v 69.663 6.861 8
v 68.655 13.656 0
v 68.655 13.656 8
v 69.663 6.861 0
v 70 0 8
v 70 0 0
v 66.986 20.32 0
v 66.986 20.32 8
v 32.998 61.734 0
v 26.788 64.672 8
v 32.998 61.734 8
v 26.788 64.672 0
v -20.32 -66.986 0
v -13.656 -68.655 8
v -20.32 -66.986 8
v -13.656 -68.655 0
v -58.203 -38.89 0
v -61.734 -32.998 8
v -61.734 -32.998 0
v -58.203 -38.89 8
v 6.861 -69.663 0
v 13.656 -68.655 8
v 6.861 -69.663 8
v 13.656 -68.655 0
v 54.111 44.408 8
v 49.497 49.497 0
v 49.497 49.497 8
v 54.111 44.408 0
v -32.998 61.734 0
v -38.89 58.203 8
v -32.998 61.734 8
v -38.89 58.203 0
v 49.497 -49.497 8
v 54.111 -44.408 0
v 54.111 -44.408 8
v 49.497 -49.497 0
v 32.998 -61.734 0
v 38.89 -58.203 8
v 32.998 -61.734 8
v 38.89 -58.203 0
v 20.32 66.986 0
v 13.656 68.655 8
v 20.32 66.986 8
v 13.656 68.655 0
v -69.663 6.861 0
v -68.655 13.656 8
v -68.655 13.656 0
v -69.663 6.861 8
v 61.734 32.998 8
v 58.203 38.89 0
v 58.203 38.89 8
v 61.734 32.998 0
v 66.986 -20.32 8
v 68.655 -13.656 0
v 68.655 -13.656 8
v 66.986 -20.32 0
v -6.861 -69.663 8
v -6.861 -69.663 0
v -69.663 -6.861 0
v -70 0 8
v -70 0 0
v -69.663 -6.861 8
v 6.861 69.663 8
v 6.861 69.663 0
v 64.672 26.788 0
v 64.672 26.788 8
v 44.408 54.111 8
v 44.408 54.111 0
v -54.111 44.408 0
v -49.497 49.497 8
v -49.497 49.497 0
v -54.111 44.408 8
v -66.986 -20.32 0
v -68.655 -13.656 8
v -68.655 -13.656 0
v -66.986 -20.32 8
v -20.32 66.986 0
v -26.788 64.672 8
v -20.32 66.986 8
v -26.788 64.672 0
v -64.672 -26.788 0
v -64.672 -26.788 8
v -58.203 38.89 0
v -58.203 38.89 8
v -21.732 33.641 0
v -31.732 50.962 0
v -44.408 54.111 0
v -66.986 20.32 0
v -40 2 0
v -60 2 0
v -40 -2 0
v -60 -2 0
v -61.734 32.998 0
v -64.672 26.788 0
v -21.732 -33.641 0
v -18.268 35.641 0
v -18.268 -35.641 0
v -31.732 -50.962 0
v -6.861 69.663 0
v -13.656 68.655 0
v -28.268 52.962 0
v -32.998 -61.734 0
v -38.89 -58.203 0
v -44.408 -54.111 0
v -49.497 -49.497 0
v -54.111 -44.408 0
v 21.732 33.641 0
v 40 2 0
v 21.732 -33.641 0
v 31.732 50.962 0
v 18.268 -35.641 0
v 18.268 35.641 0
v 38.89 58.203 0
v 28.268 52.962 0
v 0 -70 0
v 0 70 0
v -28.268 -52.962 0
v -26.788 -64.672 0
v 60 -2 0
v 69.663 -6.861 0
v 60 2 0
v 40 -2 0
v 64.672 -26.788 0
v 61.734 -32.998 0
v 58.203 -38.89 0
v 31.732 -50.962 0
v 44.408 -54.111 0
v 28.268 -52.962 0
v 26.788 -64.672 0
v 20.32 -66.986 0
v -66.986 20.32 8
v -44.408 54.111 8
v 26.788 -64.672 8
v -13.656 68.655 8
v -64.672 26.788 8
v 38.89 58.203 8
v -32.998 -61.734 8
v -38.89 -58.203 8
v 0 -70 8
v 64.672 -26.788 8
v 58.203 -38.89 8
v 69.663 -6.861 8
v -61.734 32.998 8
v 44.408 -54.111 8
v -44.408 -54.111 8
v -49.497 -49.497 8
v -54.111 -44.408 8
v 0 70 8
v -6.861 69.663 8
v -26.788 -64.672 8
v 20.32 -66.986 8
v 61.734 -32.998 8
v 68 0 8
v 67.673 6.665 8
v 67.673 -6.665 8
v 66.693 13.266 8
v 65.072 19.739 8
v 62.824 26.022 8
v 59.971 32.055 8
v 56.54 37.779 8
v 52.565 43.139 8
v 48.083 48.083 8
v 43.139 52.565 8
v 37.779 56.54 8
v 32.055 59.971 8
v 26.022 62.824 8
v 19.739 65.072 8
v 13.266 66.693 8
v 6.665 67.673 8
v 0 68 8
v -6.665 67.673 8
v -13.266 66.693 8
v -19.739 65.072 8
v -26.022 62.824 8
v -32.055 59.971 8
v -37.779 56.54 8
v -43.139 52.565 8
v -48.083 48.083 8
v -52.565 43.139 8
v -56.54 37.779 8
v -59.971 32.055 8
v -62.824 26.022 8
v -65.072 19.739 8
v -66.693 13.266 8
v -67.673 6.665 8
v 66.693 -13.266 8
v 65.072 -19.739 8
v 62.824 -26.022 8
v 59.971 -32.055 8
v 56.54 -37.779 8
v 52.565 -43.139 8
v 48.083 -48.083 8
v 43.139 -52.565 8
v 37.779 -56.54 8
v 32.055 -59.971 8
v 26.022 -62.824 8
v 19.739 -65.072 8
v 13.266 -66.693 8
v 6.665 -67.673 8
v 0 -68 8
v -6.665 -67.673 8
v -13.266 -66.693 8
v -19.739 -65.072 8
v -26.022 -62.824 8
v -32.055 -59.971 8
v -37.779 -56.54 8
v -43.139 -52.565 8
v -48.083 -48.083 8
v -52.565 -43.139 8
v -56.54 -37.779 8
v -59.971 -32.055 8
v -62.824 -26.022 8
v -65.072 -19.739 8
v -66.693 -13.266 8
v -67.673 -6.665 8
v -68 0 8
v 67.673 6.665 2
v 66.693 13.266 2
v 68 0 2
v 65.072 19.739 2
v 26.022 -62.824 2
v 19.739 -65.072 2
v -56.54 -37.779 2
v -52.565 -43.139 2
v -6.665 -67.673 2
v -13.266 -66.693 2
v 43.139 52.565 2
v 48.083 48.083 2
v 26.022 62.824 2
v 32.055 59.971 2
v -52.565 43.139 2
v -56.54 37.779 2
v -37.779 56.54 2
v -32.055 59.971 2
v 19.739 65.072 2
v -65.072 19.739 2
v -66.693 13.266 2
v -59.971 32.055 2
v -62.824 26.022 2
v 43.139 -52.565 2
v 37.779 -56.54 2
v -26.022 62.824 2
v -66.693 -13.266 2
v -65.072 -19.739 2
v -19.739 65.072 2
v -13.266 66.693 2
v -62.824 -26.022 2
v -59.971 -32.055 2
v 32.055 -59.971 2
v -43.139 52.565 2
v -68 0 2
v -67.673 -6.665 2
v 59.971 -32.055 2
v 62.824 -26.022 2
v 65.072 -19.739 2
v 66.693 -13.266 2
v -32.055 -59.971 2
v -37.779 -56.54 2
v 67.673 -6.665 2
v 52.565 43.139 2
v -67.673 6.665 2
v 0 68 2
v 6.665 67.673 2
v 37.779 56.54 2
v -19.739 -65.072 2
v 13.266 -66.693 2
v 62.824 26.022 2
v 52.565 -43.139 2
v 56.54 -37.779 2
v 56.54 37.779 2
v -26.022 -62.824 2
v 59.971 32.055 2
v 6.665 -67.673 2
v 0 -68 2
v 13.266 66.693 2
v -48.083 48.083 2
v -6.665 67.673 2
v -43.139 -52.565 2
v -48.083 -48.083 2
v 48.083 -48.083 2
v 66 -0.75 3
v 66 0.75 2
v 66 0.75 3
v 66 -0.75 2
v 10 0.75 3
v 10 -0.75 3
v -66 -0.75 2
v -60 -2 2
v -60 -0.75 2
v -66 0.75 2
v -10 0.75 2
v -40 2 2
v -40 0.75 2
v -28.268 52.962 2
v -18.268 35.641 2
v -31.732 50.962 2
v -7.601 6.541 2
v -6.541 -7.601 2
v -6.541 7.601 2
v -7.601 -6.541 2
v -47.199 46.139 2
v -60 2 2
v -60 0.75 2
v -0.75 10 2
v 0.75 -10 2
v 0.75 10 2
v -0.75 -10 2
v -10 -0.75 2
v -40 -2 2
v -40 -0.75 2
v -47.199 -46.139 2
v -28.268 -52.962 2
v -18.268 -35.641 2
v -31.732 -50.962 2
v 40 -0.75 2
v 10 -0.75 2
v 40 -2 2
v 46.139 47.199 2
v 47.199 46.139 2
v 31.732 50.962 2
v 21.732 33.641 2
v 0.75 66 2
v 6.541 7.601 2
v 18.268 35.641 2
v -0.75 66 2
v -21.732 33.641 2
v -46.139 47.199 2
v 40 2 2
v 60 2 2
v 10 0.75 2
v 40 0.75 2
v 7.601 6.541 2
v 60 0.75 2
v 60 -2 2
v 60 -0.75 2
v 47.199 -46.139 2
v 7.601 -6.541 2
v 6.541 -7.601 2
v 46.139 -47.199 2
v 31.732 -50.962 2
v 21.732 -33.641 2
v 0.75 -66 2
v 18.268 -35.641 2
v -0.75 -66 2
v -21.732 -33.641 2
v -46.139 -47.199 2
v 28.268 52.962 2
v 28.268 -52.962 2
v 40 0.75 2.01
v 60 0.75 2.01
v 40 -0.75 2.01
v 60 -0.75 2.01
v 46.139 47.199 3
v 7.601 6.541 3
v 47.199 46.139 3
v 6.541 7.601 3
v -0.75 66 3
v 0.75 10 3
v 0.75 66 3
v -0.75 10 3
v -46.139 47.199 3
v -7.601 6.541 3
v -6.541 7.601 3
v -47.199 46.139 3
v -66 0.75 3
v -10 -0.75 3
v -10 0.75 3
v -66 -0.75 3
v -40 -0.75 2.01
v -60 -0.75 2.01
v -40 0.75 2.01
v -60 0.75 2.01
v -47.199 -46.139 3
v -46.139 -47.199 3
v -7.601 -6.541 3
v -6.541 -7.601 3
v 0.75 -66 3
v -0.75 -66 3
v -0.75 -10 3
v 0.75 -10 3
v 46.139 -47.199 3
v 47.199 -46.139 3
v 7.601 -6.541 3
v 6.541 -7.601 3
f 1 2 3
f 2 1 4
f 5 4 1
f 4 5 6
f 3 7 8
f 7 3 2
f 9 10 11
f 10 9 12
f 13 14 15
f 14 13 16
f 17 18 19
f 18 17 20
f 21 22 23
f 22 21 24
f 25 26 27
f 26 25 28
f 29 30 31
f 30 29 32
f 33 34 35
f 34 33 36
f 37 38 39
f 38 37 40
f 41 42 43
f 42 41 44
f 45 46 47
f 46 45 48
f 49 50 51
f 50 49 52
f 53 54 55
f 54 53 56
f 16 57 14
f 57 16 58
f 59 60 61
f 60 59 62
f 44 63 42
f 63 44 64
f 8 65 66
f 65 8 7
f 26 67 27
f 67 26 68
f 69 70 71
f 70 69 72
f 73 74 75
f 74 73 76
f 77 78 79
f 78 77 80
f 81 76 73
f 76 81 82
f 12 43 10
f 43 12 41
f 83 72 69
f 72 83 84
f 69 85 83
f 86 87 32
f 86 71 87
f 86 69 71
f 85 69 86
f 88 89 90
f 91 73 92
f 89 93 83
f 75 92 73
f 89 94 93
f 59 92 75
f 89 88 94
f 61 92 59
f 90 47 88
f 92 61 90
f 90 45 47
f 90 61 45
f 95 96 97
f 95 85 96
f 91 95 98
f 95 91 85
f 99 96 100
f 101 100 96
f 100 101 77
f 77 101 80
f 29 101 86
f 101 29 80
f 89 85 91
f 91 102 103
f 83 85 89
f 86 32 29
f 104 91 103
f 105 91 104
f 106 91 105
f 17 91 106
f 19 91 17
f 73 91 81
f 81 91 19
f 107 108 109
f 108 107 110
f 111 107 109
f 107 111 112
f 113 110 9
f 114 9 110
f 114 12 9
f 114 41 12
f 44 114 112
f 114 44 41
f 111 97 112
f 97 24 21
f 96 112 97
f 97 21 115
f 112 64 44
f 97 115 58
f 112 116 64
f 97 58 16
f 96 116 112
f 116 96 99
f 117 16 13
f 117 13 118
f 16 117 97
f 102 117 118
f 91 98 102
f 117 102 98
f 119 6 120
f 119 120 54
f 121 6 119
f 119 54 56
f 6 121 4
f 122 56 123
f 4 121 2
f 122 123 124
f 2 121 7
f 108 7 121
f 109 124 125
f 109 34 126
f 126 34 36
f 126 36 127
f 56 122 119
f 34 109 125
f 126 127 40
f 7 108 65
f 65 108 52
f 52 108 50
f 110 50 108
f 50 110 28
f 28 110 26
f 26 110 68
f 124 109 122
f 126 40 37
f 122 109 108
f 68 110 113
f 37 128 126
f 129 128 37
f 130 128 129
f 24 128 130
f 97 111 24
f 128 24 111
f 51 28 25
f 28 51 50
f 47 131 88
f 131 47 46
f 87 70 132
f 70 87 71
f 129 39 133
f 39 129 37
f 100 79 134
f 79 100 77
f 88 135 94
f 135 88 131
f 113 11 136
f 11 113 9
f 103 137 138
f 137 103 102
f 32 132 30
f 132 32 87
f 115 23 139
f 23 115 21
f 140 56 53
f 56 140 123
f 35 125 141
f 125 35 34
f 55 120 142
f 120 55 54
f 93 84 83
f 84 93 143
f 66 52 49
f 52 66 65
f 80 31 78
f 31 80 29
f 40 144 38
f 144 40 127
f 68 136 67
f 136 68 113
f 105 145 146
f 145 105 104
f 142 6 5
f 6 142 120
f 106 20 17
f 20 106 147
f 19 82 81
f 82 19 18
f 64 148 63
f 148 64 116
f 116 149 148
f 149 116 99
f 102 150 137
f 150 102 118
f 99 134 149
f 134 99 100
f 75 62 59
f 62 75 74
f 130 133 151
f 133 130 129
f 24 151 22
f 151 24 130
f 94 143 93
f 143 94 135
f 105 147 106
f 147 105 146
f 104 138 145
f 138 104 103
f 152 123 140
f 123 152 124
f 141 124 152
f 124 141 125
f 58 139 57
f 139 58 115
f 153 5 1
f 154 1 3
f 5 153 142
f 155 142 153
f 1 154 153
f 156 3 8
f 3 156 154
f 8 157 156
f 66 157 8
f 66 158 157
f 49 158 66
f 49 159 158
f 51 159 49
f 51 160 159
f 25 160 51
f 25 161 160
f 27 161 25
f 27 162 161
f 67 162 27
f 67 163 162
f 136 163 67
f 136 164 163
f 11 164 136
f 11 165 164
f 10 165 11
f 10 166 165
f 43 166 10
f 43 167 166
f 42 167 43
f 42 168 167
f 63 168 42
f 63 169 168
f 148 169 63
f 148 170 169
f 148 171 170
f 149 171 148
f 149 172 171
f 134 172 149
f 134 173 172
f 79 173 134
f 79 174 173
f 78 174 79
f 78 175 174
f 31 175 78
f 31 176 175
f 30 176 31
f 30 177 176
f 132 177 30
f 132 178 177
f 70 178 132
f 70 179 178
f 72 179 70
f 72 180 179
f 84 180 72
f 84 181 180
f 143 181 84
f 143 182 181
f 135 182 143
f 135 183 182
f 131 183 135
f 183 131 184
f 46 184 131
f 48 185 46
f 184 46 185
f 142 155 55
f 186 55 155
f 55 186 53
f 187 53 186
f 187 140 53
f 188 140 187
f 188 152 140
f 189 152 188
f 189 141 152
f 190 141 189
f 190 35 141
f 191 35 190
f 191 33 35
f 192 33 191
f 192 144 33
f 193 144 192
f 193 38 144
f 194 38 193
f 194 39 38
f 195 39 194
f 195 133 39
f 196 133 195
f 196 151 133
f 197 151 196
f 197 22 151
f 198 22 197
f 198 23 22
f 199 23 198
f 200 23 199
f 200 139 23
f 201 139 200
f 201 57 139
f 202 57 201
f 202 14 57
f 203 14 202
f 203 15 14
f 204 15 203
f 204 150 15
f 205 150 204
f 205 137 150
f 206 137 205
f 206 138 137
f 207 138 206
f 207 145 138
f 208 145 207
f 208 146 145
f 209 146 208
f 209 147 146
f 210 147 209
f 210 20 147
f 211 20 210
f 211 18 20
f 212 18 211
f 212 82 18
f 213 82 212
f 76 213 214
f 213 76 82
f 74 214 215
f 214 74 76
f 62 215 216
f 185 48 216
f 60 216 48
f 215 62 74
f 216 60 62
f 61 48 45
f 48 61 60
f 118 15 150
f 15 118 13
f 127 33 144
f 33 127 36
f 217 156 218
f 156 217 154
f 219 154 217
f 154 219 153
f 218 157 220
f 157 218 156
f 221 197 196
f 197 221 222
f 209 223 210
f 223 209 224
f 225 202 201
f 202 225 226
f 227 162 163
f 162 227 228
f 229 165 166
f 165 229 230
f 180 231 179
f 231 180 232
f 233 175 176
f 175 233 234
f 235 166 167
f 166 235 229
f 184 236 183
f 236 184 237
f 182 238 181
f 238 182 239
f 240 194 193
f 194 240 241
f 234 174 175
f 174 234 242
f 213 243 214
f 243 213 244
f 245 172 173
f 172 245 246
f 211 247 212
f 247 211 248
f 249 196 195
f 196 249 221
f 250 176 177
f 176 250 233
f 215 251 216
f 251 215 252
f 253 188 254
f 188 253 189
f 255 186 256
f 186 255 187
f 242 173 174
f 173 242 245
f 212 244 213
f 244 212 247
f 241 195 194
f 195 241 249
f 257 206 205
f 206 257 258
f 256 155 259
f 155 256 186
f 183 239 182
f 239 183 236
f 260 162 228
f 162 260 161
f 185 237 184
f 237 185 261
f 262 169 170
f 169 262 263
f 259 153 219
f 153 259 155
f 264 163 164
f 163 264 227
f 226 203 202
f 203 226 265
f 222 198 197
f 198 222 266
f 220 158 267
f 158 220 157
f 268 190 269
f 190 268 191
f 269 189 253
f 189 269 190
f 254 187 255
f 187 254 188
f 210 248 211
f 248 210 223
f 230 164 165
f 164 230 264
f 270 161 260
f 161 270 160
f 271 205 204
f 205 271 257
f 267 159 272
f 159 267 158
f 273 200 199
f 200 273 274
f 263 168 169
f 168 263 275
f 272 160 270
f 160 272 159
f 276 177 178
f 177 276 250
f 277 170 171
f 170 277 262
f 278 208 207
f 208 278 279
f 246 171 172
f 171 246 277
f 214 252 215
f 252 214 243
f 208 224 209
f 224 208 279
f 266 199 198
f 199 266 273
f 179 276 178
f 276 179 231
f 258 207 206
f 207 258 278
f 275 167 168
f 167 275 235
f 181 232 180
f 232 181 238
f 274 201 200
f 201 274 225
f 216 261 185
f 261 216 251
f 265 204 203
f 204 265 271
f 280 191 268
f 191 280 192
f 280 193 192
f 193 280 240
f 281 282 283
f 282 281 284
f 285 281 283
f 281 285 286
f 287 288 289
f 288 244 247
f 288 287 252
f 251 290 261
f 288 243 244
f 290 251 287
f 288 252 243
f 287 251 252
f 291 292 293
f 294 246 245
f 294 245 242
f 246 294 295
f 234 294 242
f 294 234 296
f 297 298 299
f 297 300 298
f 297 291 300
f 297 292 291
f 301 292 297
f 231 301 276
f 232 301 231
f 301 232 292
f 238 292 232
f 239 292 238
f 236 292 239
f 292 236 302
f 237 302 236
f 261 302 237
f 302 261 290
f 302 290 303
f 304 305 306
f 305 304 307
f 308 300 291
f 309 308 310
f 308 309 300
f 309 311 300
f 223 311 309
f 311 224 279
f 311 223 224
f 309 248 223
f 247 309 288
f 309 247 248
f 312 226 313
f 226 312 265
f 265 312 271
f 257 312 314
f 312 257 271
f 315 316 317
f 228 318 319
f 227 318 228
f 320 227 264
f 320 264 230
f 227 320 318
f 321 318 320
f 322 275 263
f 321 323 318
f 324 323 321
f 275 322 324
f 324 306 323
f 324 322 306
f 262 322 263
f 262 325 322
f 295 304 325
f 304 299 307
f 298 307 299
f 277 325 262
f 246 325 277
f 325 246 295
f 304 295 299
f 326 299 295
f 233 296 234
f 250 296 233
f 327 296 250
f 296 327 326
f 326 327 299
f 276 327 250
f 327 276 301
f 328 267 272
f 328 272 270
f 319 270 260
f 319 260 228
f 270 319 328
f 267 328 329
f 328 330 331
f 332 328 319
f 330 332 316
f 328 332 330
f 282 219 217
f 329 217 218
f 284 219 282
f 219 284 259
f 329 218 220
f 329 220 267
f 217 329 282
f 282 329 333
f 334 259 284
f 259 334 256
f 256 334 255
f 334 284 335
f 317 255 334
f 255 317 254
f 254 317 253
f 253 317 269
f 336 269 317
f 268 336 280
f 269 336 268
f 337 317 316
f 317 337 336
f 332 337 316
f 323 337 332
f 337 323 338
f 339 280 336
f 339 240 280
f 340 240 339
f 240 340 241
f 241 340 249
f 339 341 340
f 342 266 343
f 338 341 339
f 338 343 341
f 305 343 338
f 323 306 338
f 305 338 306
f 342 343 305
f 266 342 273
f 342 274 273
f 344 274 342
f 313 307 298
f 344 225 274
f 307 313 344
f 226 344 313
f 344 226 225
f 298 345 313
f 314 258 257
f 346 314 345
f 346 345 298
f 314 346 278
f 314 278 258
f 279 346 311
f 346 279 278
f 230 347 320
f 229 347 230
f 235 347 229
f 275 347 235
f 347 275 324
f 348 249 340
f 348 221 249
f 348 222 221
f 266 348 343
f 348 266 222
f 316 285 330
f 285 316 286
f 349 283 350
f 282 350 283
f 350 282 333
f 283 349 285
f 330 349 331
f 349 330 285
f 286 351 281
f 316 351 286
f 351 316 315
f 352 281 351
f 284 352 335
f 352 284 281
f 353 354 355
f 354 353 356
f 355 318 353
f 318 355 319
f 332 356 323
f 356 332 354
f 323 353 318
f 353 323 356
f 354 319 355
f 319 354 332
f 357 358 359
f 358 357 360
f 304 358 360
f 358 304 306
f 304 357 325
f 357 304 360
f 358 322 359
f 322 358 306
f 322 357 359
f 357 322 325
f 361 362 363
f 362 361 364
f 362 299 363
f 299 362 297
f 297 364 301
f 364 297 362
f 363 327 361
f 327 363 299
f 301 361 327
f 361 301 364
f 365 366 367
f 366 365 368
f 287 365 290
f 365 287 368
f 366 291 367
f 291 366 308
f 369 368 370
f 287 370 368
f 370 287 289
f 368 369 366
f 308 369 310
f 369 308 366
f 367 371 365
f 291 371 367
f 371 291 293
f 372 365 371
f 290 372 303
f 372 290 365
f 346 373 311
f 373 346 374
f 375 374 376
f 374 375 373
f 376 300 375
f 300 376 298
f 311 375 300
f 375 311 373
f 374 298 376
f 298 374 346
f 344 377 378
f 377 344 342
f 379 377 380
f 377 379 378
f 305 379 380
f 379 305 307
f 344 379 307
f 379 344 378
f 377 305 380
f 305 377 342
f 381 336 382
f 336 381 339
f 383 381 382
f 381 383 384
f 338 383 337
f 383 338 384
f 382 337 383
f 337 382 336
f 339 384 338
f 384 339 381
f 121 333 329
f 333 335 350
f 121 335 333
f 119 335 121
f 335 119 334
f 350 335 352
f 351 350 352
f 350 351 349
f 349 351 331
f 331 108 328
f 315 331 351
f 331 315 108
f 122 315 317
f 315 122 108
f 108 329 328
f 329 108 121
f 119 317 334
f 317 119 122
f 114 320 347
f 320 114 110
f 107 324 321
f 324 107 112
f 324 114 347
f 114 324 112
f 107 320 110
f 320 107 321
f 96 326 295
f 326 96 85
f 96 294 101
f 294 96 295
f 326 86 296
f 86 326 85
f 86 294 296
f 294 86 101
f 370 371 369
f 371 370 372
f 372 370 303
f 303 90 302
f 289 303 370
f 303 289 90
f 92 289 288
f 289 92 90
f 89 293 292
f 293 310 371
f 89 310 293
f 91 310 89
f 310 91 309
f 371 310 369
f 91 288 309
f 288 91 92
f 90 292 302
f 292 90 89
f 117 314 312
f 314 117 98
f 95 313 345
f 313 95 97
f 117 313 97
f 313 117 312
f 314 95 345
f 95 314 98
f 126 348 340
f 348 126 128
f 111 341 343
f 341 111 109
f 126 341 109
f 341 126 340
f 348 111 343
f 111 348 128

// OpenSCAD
// file: parameters.scad
// =============================================================================
// The Void -- Parametric Constants Module
// =============================================================================
//
// All dimensions for The Void mushroom cultivation dome.
// Units: millimeters (mm) unless otherwise noted.
// Source: PRODUCT-SPEC.md
//
// Usage: include <parameters.scad> in any module file.
// =============================================================================

// -----------------------------------------------------------------------------
// Global Settings
// -----------------------------------------------------------------------------

// Render quality: set quality = "preview" for fast preview, "render" for final
// From PRODUCT-SPEC.md OpenSCAD conventions
quality = "preview";  // "preview" or "render"
$fn = (quality == "render") ? 128 : 64;

// FDM printing tolerance / clearance
// Standard FDM tolerance for friction-fit parts
fdm_tolerance = 0.2;  // mm -- default clearance for FDM printing

// Small epsilon for boolean operations (prevents z-fighting)
eps = 0.01;  // mm

// -----------------------------------------------------------------------------
// Overall Dimensions
// From PRODUCT-SPEC.md Section 1 -- Overall Dimensions
// -----------------------------------------------------------------------------

total_diameter = 203;   // mm (8.0") -- widest point at dome-base junction
total_height   = 254;   // mm (10.0") -- dome + base assembled
dome_height    = 165;   // mm (6.5") -- from base top to dome apex
base_height    = 89;    // mm (3.5") -- houses electronics, platform, airflow plenum

// -----------------------------------------------------------------------------
// Dome Parameters
// From PRODUCT-SPEC.md Section 2 -- Dome Shell
// -----------------------------------------------------------------------------

dome_outer_diameter = 203;  // mm (8.0") -- matches total_diameter
dome_inner_diameter = 190;  // mm (7.5") -- wall thickness reduces usable interior
dome_wall_thickness = 2.0;  // mm -- structural integrity + light diffusion

// Dome geometry breakdown
dome_vertical_sidewall_height = 25;   // mm (1.0") -- straight-walled section at base
dome_hemisphere_height        = 140;  // mm (dome_height - sidewall = 165 - 25)
dome_apex_flat                = 10;   // mm -- flat at top for clean 3D print bridging

// Derived dome radii
dome_outer_radius = dome_outer_diameter / 2;  // 101.5 mm
dome_inner_radius = dome_inner_diameter / 2;  // 95.0 mm

// Exhaust vents (dome upper)
// From PRODUCT-SPEC.md Section 4 -- Exhaust Vents
exhaust_vent_diameter        = 12;   // mm (0.47") -- individual hole diameter
exhaust_vent_count           = 4;    // quantity -- evenly spaced around circumference
exhaust_vent_angle_from_apex = 60;   // degrees -- position in upper third of dome

// Magnet pocket (dome seating lip)
// From PRODUCT-SPEC.md Section 2 -- Magnetic reed switch integration
magnet_pocket_diameter = 6.5;  // mm -- sized for 6mm neodymium disc magnet + clearance
magnet_pocket_depth    = 2.5;  // mm -- depth into dome seating lip

// Alignment notch (dome seating lip)
// From PRODUCT-SPEC.md Section 2 -- Dome-to-Base Interface
alignment_notch_width = 5;  // mm -- single notch for dome orientation
alignment_notch_depth = 3;  // mm -- depth of rectangular cutout in seating lip

// Seating lip
// From PRODUCT-SPEC.md Section 2 -- Dome-to-Base Interface
dome_seating_lip_height = 2.0;  // mm -- inward step at bottom edge of dome
dome_seating_lip_inset  = 2.0;  // mm -- how far inward the lip steps

// -----------------------------------------------------------------------------
// Base Parameters
// From PRODUCT-SPEC.md Section 3 -- Base Unit
// -----------------------------------------------------------------------------

base_outer_diameter = 203;  // mm (8.0") -- matches dome diameter for flush fit
// base_height already defined above (89 mm)
base_wall_thickness = 2.5;  // mm -- slightly thicker than dome for rigidity

// Dome seating channel (base top rim)
// From PRODUCT-SPEC.md Section 2 -- Dome-to-Base Interface
dome_seating_channel_depth = 2.0;  // mm -- recessed channel in base top surface
dome_seating_channel_width = 2.0;  // mm -- width of the seating groove

// Silicone gasket groove
// From PRODUCT-SPEC.md Section 2 -- silicone gasket ring in base channel
gasket_groove_depth = 1.5;  // mm -- groove for silicone gasket ring
gasket_groove_width = 2.0;  // mm -- width of gasket groove

// Intake vents (base lower perimeter)
// From PRODUCT-SPEC.md Section 4 -- Intake Vents
intake_vent_width  = 15;  // mm (0.6") -- individual slot width
intake_vent_height = 5;   // mm (0.2") -- individual slot height
intake_vent_count  = 8;   // quantity -- evenly distributed around circumference

// USB-C cutout (rear-center of base)
// From PRODUCT-SPEC.md Section 10 -- Physical Connectors
usb_cutout_width  = 9;    // mm -- rectangular cutout for USB-C receptacle
usb_cutout_height = 3.5;  // mm -- height of USB-C cutout

// Mode button cutout (front-center of base)
// From PRODUCT-SPEC.md Section 10 -- Physical Controls
button_cutout_diameter = 12;  // mm -- waterproof silicone-cap tactile switch

// Red indicator LED hole
// From PRODUCT-SPEC.md Section 10 -- Visual Indicators
led_indicator_diameter = 3;  // mm -- 3mm through-hole LED

// -----------------------------------------------------------------------------
// Platform Parameters
// From PRODUCT-SPEC.md Section 3 -- Substrate Platform
// -----------------------------------------------------------------------------

platform_diameter  = 140;  // mm (5.5") -- centered in base, sized for Void Pack
platform_depth     = 13;   // mm (0.5") -- shallow recessed well
platform_rim_height = 6;   // mm (0.25") -- raised lip prevents block sliding

// Drain slots in platform
// From PRODUCT-SPEC.md Section 3 -- Substrate Platform (4-6 drain slots)
drain_slot_count  = 6;   // quantity
drain_slot_width  = 4;   // mm
drain_slot_length = 20;  // mm

// -----------------------------------------------------------------------------
// Void Core Additions
// From PRODUCT-SPEC.md Section 8 -- Void Core Smart Electronics
// -----------------------------------------------------------------------------

// Raspberry Pi Zero W 2 dimensions
pi_zero_width  = 30;  // mm -- board width
pi_zero_length = 65;  // mm -- board length

// 30mm axial fan
// From PRODUCT-SPEC.md Section 4 -- Void Core Active Airflow
fan_diameter = 30;  // mm -- 5V DC axial fan
fan_depth    = 10;  // mm -- fan thickness

// BME280 sensor breakout board
// From PRODUCT-SPEC.md Section 8 -- BME280 sensor
bme280_width  = 13;  // mm -- typical breakout board width
bme280_length = 11;  // mm -- typical breakout board length

// Piezoelectric humidifier reservoir
// From PRODUCT-SPEC.md Section 5 -- Void Core Active Humidity
humidifier_reservoir_diameter = 40;  // mm -- reservoir well diameter
humidifier_reservoir_depth    = 25;  // mm -- reservoir well depth

// Motorized damper servo
// From PRODUCT-SPEC.md Section 8 -- Motorized damper
servo_width  = 12;  // mm -- small servo width
servo_length = 23;  // mm -- small servo length

// -----------------------------------------------------------------------------
// Vent Cap Parameters
// From PRODUCT-SPEC.md Section 4 -- Exhaust Vent Cover Design
// From BUILD-GUIDE.md Section 2 -- void-vent-cap.stl
// -----------------------------------------------------------------------------

vent_cap_outer_diameter  = 16;   // mm (exhaust_vent_diameter + 4mm lip)
vent_cap_inner_diameter  = 12;   // mm -- matches exhaust vent hole diameter
vent_cap_depth           = 4;    // mm -- depth of cap body
vent_cap_snap_thickness  = 1.0;  // mm -- snap-fit tab thickness
// main file
// =============================================================================
// The Void -- Substrate Platform Module
// =============================================================================
//
// A shallow dish that holds the substrate block inside the dome.
// Sits on the base's internal support ledge at z=45mm.
//
// Geometry:
//   1. Base disc -- 140mm diameter, 2mm thick solid floor
//   2. Rim wall -- 6mm above disc surface, 2mm thick perimeter wall
//   3. Drain slots -- 6 radial slots (4mm x 20mm) cut through the floor
//   4. Drainage ribs -- 8 small radial ridges (1mm tall, 1.5mm wide)
//      on the floor between drain slots, elevating substrate for drainage
//
// The platform diameter (140mm) fits inside the base inner diameter (198mm)
// with clearance, and rests on the 3mm wide ledge ring at z=45mm.
//
// Source: PRODUCT-SPEC.md Section 3 -- Substrate Platform
// =============================================================================

include <parameters.scad>

// -----------------------------------------------------------------------------
// Derived platform constants
// -----------------------------------------------------------------------------

_plat_r = platform_diameter / 2;        // 70 mm -- platform outer radius
_plat_floor_h = 2;                      // mm -- floor disc thickness
_plat_rim_h = platform_rim_height + _plat_floor_h;  // 8 mm -- total rim height
_plat_rim_thickness = 2;                // mm -- rim wall thickness

// Drain slot positioning
// Slots start ~10mm inside the rim and extend toward center
_drain_start_r = _plat_r - 10;         // 60 mm -- outer end of slot (near rim)
_drain_end_r = _drain_start_r - drain_slot_length;  // 40 mm -- inner end of slot

// Drainage rib parameters
_rib_count = 8;                         // number of radial ribs
_rib_height = 1;                        // mm -- raised above floor surface
_rib_width = 1.5;                       // mm -- rib cross-section width
_rib_inner_r = 10;                      // mm -- ribs start 10mm from center
_rib_outer_r = _plat_r - _plat_rim_thickness - 2;  // mm -- stop 2mm before rim

// =============================================================================
// platform() -- Main substrate platform module
// =============================================================================
// Creates the shallow dish with rim, drain slots, and drainage ribs.
// Origin at center of disc bottom surface.
// =============================================================================

module platform() {
    difference() {
        union() {
            // 1. Base disc (solid floor)
            cylinder(
                h = _plat_floor_h,
                r = _plat_r,
                center = false
            );

            // 2. Rim wall (perimeter)
            // A hollow cylinder extending above the disc surface
            difference() {
                cylinder(
                    h = _plat_rim_h,
                    r = _plat_r,
                    center = false
                );
                translate([0, 0, -eps])
                    cylinder(
                        h = _plat_rim_h + 2 * eps,
                        r = _plat_r - _plat_rim_thickness,
                        center = false
                    );
            }

            // 3. Drainage ribs (small radial ridges on floor surface)
            // 8 ribs evenly spaced (45 deg apart), raised 1mm above the floor
            // These elevate the substrate block so water flows underneath
            // to the drain slots.
            for (i = [0 : _rib_count - 1]) {
                rotate([0, 0, i * (360 / _rib_count)])
                    translate([(_rib_inner_r + _rib_outer_r) / 2, 0, _plat_floor_h + _rib_height / 2])
                        cube(
                            [_rib_outer_r - _rib_inner_r,
                             _rib_width,
                             _rib_height],
                            center = true
                        );
            }
        }

        // 4. Drain slots (cut through the floor)
        // 6 radial slots equally spaced (60 deg apart)
        // Each is a rectangular cutout extending through the full floor thickness
        for (i = [0 : drain_slot_count - 1]) {
            rotate([0, 0, i * (360 / drain_slot_count)])
                translate([(_drain_start_r + _drain_end_r) / 2, 0, _plat_floor_h / 2])
                    cube(
                        [drain_slot_length,
                         drain_slot_width,
                         _plat_floor_h + 2 * eps],
                        center = true
                    );
        }
    }
}

// =============================================================================
// Render when called directly
// =============================================================================
platform();
